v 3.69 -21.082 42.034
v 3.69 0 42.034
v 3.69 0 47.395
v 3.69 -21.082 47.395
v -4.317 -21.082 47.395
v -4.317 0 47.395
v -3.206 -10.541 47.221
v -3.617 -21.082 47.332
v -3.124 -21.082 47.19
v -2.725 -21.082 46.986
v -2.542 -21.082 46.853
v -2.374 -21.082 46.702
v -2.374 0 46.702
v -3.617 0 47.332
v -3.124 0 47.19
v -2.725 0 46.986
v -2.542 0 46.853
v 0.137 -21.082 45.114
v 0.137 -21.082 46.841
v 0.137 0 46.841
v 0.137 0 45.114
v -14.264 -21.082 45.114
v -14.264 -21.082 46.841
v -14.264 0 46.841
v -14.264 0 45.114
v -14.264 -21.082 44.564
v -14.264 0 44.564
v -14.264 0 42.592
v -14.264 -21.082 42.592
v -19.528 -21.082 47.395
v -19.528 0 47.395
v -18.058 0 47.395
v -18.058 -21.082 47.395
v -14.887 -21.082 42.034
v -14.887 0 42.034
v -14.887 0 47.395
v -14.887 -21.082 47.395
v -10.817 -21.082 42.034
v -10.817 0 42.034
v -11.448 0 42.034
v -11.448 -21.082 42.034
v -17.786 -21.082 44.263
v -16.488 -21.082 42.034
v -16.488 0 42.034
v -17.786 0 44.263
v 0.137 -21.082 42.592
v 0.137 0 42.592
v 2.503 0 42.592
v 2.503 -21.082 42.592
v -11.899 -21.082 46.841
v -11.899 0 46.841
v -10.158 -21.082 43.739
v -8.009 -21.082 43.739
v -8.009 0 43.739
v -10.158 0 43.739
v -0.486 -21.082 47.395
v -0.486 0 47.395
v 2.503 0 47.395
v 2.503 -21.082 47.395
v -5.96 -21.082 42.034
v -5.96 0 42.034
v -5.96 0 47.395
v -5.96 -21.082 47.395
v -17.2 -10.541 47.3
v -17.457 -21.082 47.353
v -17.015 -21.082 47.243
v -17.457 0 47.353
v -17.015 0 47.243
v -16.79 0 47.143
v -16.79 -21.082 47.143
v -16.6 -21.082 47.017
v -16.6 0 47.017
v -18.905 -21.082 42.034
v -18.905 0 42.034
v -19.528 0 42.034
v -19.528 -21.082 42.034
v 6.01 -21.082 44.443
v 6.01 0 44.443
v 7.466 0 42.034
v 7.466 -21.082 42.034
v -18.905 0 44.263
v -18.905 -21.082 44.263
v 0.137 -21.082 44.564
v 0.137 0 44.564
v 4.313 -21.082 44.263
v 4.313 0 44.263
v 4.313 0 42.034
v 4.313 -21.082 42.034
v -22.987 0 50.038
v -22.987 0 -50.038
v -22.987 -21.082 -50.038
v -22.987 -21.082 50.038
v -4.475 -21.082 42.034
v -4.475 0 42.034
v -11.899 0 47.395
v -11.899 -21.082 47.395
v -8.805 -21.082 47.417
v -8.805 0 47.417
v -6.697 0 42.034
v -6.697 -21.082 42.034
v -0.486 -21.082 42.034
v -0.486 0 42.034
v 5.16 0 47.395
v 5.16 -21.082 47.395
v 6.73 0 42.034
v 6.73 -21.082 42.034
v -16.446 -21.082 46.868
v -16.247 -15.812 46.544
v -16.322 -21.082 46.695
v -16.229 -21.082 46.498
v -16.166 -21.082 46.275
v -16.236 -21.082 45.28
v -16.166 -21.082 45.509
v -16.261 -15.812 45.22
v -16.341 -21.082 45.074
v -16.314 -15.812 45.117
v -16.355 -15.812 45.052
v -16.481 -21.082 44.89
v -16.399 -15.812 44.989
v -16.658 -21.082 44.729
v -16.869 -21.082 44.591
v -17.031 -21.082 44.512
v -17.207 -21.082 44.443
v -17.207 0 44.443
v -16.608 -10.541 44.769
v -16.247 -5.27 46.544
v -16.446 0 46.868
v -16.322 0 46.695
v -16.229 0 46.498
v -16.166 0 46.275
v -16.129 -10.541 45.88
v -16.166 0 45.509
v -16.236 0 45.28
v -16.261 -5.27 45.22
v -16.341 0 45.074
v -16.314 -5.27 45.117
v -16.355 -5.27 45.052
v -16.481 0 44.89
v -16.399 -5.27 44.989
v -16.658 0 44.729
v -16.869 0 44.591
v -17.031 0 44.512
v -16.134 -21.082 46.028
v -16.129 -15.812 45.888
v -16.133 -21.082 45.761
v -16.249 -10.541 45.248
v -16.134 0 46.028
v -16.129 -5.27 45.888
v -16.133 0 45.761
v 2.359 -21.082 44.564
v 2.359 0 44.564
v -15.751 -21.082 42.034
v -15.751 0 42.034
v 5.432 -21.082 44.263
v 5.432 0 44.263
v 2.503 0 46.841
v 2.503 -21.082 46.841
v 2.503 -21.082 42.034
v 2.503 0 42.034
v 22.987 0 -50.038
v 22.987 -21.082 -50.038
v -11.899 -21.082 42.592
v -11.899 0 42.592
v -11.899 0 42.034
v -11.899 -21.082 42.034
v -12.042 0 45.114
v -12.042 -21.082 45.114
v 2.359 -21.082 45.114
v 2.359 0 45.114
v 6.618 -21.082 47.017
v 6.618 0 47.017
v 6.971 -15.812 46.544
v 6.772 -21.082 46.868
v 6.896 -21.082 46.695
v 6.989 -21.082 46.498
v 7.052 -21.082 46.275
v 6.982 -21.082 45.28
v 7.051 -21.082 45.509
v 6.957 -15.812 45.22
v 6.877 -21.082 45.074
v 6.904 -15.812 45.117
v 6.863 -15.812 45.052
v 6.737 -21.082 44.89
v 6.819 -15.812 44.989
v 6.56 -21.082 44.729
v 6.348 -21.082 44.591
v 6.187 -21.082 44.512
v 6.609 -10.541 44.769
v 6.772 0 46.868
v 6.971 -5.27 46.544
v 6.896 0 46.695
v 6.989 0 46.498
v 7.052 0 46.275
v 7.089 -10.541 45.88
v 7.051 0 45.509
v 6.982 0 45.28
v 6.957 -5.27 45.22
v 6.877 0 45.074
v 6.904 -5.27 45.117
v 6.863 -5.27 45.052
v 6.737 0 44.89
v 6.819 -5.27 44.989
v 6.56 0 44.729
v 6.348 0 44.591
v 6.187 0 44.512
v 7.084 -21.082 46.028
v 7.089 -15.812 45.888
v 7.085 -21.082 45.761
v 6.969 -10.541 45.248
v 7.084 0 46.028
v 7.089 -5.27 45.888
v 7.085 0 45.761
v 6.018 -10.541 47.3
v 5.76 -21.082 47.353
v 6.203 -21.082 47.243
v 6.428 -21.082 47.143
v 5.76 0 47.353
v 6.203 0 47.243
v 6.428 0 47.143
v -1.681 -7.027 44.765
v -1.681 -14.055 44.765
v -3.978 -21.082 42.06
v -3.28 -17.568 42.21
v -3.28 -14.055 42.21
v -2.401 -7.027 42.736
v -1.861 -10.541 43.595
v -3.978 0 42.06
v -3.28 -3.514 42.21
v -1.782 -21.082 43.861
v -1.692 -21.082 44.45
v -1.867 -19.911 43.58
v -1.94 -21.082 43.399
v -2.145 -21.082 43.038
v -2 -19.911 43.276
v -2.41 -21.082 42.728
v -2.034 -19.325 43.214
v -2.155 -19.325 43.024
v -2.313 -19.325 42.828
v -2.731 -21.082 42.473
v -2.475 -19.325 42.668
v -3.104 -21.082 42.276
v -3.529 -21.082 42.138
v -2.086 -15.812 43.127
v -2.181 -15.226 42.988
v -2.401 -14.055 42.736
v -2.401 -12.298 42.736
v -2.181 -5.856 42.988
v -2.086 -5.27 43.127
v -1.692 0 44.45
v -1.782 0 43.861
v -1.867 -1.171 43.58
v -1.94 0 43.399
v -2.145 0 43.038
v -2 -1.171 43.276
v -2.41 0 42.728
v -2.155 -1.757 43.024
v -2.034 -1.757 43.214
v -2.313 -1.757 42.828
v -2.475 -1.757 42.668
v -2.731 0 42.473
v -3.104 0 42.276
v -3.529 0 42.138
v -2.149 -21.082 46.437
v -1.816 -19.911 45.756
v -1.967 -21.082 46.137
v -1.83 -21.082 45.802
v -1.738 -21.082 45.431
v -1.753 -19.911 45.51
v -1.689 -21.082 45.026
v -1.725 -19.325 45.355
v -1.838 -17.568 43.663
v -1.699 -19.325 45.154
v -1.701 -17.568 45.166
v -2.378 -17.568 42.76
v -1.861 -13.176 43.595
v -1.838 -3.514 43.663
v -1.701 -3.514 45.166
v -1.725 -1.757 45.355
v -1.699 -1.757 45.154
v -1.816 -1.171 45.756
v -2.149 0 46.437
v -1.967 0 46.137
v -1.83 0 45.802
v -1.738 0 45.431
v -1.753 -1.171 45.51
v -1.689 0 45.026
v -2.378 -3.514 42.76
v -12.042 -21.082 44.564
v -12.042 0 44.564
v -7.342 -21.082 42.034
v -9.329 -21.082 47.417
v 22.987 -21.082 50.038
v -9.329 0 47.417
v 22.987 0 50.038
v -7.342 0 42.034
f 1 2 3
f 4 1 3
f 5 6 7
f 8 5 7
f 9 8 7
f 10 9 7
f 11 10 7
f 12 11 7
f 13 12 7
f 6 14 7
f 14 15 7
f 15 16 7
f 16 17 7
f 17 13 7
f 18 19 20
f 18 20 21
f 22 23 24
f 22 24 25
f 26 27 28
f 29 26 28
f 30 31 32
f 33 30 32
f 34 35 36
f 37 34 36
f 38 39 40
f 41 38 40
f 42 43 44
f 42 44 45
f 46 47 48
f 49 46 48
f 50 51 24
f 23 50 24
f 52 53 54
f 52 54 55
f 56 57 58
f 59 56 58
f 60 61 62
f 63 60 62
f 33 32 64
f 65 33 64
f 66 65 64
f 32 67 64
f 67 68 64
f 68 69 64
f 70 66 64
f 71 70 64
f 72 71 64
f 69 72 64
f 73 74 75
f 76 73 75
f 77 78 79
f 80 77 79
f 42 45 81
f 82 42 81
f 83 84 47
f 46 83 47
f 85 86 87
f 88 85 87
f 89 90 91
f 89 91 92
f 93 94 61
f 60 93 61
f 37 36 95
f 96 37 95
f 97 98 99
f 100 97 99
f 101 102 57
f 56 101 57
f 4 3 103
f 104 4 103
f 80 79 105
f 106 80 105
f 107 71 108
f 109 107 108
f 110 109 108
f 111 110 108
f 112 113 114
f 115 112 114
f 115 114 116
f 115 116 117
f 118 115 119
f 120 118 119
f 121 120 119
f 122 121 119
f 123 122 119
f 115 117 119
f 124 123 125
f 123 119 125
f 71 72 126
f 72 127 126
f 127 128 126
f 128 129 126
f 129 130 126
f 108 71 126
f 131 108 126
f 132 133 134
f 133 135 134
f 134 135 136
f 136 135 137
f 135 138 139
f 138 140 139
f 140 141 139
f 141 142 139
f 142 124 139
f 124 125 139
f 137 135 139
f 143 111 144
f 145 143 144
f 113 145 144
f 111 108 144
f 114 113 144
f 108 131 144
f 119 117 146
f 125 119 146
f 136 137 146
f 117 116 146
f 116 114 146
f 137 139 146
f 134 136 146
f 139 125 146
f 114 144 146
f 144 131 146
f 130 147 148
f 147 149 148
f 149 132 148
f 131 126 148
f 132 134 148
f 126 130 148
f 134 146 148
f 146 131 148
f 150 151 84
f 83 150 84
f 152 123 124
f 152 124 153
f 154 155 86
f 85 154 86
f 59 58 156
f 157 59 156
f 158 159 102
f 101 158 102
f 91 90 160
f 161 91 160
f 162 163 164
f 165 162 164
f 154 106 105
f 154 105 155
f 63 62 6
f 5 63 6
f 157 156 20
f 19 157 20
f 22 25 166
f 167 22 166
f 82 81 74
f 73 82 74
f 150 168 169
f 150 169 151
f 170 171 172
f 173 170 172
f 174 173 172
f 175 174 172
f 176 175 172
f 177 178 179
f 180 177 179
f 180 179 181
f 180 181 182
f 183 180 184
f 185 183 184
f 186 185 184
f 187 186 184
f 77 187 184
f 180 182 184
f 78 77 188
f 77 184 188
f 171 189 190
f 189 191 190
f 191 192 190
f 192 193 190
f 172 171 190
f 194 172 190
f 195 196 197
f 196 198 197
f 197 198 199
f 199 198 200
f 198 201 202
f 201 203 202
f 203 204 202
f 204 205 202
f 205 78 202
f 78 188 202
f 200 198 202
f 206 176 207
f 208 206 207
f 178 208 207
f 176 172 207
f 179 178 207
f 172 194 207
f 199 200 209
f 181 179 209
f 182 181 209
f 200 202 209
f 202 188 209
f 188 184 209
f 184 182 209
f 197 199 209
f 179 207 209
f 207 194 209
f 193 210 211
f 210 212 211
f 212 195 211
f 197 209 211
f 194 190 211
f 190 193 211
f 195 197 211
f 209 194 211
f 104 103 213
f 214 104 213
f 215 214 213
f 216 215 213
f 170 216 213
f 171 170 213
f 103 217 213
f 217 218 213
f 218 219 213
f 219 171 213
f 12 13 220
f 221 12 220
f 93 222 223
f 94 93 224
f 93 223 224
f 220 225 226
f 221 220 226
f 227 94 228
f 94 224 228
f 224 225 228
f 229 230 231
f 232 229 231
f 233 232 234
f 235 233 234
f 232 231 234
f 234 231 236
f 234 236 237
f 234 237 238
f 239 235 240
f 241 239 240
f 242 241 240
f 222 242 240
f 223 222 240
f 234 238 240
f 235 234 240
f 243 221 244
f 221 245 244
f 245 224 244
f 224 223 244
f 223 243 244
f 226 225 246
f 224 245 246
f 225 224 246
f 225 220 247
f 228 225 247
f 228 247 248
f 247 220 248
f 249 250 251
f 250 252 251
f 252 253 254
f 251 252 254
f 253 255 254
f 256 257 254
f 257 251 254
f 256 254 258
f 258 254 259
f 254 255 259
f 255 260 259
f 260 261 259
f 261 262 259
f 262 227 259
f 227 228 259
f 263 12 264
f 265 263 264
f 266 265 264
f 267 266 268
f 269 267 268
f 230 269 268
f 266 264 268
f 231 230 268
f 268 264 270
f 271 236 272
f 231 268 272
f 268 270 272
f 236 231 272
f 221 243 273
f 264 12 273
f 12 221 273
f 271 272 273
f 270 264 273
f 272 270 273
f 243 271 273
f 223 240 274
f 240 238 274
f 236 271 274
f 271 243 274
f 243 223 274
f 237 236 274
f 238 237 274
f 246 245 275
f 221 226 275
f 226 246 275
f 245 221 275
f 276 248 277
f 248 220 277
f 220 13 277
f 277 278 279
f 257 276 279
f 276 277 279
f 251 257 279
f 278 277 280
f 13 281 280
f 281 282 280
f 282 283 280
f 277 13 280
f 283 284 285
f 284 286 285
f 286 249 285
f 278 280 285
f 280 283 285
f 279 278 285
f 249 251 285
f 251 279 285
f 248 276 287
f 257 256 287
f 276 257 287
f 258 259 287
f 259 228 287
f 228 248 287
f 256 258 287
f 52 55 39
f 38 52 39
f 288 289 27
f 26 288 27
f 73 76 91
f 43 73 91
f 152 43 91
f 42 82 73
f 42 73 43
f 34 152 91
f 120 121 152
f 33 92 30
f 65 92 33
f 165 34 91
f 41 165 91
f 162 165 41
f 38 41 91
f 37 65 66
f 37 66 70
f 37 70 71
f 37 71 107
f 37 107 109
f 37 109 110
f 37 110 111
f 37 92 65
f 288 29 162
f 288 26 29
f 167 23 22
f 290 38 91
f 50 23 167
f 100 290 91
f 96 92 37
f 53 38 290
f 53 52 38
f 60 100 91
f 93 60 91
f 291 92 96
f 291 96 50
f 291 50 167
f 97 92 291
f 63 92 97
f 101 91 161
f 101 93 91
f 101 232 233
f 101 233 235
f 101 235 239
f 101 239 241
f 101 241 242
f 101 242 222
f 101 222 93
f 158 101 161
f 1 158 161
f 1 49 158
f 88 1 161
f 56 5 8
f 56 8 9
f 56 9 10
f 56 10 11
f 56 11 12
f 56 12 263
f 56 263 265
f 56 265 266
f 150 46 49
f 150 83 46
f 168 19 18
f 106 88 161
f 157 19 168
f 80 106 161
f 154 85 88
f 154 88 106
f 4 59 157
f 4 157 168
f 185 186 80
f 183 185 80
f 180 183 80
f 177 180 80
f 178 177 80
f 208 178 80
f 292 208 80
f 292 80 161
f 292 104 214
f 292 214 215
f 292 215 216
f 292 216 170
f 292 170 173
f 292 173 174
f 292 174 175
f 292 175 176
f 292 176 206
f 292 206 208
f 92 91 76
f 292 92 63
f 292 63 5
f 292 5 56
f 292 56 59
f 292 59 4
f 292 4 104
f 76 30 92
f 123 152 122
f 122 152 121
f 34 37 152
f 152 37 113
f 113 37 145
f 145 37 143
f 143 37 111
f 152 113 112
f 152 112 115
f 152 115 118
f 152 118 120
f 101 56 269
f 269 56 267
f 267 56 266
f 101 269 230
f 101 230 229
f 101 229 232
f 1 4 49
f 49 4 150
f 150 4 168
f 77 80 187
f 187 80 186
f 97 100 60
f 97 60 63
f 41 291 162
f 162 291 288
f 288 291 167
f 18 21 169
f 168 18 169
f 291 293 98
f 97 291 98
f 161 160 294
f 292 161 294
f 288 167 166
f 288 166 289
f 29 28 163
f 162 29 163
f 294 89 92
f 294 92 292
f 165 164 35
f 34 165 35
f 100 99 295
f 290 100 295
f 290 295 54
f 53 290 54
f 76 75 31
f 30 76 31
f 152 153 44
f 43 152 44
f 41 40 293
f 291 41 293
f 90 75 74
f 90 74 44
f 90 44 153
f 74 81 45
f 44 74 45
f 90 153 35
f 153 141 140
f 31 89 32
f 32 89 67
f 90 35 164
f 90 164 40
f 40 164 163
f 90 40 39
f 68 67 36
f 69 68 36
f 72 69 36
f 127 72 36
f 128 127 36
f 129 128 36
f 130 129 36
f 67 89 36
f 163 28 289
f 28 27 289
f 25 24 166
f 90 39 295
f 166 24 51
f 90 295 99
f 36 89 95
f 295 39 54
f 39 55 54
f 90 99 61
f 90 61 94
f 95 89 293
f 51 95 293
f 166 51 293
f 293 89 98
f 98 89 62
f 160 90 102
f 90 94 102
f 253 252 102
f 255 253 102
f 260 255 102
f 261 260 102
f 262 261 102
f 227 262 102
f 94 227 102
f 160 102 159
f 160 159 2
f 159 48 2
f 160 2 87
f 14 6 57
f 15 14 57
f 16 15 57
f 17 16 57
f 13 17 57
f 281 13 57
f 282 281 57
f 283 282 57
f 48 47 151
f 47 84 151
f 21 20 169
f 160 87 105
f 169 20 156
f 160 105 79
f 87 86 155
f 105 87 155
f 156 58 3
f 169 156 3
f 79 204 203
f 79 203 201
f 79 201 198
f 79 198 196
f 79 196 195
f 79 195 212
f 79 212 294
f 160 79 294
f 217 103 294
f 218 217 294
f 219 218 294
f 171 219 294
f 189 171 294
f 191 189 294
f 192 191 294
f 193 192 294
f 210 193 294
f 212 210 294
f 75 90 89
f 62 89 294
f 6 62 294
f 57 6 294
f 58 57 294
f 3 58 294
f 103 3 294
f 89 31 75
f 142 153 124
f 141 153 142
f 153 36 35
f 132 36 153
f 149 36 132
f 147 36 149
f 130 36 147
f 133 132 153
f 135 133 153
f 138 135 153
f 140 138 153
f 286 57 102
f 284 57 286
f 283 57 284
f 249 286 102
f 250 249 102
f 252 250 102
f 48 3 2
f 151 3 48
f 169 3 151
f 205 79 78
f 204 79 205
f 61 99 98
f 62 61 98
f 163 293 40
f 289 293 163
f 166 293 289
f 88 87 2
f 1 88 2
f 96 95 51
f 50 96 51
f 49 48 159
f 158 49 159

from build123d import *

# Parameters (mm, degrees)
F0_W     = 45.974
F0_H     = 100.076
F1_DEPTH = 21.082


with BuildPart() as f1:
    # F0 (on Front) → F1 (new body)
    with BuildSketch(Plane.XZ):
        Rectangle(F0_W, F0_H)
        with BuildLine():
            Line((-17.7857931137, 44.2633313295), (-18.9050379284, 44.2633313295))
            Line((-18.9050379284, 44.2633313295), (-18.9050379284, 42.034227401))
            Line((-18.9050379284, 42.034227401), (-19.5280138157, 42.034227401))
            Line((-19.5280138157, 42.034227401), (-19.5280138157, 47.3946357427))
            Line((-19.5280138157, 47.3946357427), (-18.0579784355, 47.3946357427))
            add(Edge.make_bspline(
                [(-18.0579784355, 47.3946357427), (-17.071306644, 47.3946357427), (-16.6002617876, 47.0168612875)],
                knots=[0, 0, 0, 1, 1, 1], degree=2))
            add(Edge.make_bspline(
                [(-16.6002617876, 47.0168612875), (-16.1292169311, 46.6390868322), (-16.1292169311, 45.8800182839)],
                knots=[0, 0, 0, 1, 1, 1], degree=2))
            add(Edge.make_bspline(
                [(-16.1292169311, 45.8800182839), (-16.1292169311, 44.8170876738), (-17.2073993049, 44.4428328564)],
                knots=[0, 0, 0, 1, 1, 1], degree=2))
            Line((-17.2073993049, 44.4428328564), (-15.7514424759, 42.034227401))
            Line((-15.7514424759, 42.034227401), (-16.4882199848, 42.034227401))
            Line((-16.4882199848, 42.034227401), (-17.7857931137, 44.2633313295))
        make_face(mode=Mode.SUBTRACT)
        Polygon((-11.8986123174, 42.5915033831), (-11.8986123174, 42.034227401), (-14.8867847941, 42.034227401), (-14.8867847941, 47.3946357427), (-11.8986123174, 47.3946357427), (-11.8986123174, 46.8408793984), (-14.2638089067, 46.8408793984), (-14.2638089067, 45.1139104601), (-12.0417442538, 45.1139104601), (-12.0417442538, 44.5636737536), (-14.2638089067, 44.5636737536), (-14.2638089067, 42.5915033831), align=None, mode=Mode.SUBTRACT)
        Polygon((-6.6965876758, 42.034227401), (-7.3418546025, 42.034227401), (-8.0094125685, 43.7389053), (-10.157564828, 43.7389053), (-10.8169103057, 42.034227401), (-11.4480986813, 42.034227401), (-9.3292767366, 47.416926782), (-8.8048507071, 47.416926782), align=None, mode=Mode.SUBTRACT)
        with BuildLine():
            add(Edge.make_bspline(
                [(-2.3738858735, 46.701853706), (-1.6811038367, 46.0090716693), (-1.6811038367, 44.7654663197)],
                knots=[0, 0, 0, 1, 1, 1], degree=2))
            add(Edge.make_bspline(
                [(-1.6811038367, 44.7654663197), (-1.6811038367, 43.438562876), (-2.4014563694, 42.7363951385)],
                knots=[0, 0, 0, 1, 1, 1], degree=2))
            add(Edge.make_bspline(
                [(-2.4014563694, 42.7363951385), (-3.1218089021, 42.034227401), (-4.4745230229, 42.034227401)],
                knots=[0, 0, 0, 1, 1, 1], degree=2))
            Line((-4.4745230229, 42.034227401), (-5.9598101668, 42.034227401))
            Line((-5.9598101668, 42.034227401), (-5.9598101668, 47.3946357427))
            Line((-5.9598101668, 47.3946357427), (-4.3173125353, 47.3946357427))
            add(Edge.make_bspline(
                [(-4.3173125353, 47.3946357427), (-3.0666679102, 47.3946357427), (-2.3738858735, 46.701853706)],
                knots=[0, 0, 0, 1, 1, 1], degree=2))
        make_face(mode=Mode.SUBTRACT)
        Polygon((2.5025722732, 42.5915033831), (2.5025722732, 42.034227401), (-0.4856002035, 42.034227401), (-0.4856002035, 47.3946357427), (2.5025722732, 47.3946357427), (2.5025722732, 46.8408793984), (0.1373756839, 46.8408793984), (0.1373756839, 45.1139104601), (2.3594403368, 45.1139104601), (2.3594403368, 44.5636737536), (0.1373756839, 44.5636737536), (0.1373756839, 42.5915033831), align=None, mode=Mode.SUBTRACT)
        with BuildLine():
            Line((5.4320841203, 44.2633313295), (4.3128393057, 44.2633313295))
            Line((4.3128393057, 44.2633313295), (4.3128393057, 42.034227401))
            Line((4.3128393057, 42.034227401), (3.6898634183, 42.034227401))
            Line((3.6898634183, 42.034227401), (3.6898634183, 47.3946357427))
            Line((3.6898634183, 47.3946357427), (5.1598987985, 47.3946357427))
            add(Edge.make_bspline(
                [(5.1598987985, 47.3946357427), (6.14657059, 47.3946357427), (6.6176154465, 47.0168612875)],
                knots=[0, 0, 0, 1, 1, 1], degree=2))
            add(Edge.make_bspline(
                [(6.6176154465, 47.0168612875), (7.0886603029, 46.6390868322), (7.0886603029, 45.8800182839)],
                knots=[0, 0, 0, 1, 1, 1], degree=2))
            add(Edge.make_bspline(
                [(7.0886603029, 45.8800182839), (7.0886603029, 44.8170876738), (6.0104779291, 44.4428328564)],
                knots=[0, 0, 0, 1, 1, 1], degree=2))
            Line((6.0104779291, 44.4428328564), (7.4664347582, 42.034227401))
            Line((7.4664347582, 42.034227401), (6.7296572492, 42.034227401))
            Line((6.7296572492, 42.034227401), (5.4320841203, 44.2633313295))
        make_face(mode=Mode.SUBTRACT)
    extrude(amount=F1_DEPTH)


solid = f1.part
